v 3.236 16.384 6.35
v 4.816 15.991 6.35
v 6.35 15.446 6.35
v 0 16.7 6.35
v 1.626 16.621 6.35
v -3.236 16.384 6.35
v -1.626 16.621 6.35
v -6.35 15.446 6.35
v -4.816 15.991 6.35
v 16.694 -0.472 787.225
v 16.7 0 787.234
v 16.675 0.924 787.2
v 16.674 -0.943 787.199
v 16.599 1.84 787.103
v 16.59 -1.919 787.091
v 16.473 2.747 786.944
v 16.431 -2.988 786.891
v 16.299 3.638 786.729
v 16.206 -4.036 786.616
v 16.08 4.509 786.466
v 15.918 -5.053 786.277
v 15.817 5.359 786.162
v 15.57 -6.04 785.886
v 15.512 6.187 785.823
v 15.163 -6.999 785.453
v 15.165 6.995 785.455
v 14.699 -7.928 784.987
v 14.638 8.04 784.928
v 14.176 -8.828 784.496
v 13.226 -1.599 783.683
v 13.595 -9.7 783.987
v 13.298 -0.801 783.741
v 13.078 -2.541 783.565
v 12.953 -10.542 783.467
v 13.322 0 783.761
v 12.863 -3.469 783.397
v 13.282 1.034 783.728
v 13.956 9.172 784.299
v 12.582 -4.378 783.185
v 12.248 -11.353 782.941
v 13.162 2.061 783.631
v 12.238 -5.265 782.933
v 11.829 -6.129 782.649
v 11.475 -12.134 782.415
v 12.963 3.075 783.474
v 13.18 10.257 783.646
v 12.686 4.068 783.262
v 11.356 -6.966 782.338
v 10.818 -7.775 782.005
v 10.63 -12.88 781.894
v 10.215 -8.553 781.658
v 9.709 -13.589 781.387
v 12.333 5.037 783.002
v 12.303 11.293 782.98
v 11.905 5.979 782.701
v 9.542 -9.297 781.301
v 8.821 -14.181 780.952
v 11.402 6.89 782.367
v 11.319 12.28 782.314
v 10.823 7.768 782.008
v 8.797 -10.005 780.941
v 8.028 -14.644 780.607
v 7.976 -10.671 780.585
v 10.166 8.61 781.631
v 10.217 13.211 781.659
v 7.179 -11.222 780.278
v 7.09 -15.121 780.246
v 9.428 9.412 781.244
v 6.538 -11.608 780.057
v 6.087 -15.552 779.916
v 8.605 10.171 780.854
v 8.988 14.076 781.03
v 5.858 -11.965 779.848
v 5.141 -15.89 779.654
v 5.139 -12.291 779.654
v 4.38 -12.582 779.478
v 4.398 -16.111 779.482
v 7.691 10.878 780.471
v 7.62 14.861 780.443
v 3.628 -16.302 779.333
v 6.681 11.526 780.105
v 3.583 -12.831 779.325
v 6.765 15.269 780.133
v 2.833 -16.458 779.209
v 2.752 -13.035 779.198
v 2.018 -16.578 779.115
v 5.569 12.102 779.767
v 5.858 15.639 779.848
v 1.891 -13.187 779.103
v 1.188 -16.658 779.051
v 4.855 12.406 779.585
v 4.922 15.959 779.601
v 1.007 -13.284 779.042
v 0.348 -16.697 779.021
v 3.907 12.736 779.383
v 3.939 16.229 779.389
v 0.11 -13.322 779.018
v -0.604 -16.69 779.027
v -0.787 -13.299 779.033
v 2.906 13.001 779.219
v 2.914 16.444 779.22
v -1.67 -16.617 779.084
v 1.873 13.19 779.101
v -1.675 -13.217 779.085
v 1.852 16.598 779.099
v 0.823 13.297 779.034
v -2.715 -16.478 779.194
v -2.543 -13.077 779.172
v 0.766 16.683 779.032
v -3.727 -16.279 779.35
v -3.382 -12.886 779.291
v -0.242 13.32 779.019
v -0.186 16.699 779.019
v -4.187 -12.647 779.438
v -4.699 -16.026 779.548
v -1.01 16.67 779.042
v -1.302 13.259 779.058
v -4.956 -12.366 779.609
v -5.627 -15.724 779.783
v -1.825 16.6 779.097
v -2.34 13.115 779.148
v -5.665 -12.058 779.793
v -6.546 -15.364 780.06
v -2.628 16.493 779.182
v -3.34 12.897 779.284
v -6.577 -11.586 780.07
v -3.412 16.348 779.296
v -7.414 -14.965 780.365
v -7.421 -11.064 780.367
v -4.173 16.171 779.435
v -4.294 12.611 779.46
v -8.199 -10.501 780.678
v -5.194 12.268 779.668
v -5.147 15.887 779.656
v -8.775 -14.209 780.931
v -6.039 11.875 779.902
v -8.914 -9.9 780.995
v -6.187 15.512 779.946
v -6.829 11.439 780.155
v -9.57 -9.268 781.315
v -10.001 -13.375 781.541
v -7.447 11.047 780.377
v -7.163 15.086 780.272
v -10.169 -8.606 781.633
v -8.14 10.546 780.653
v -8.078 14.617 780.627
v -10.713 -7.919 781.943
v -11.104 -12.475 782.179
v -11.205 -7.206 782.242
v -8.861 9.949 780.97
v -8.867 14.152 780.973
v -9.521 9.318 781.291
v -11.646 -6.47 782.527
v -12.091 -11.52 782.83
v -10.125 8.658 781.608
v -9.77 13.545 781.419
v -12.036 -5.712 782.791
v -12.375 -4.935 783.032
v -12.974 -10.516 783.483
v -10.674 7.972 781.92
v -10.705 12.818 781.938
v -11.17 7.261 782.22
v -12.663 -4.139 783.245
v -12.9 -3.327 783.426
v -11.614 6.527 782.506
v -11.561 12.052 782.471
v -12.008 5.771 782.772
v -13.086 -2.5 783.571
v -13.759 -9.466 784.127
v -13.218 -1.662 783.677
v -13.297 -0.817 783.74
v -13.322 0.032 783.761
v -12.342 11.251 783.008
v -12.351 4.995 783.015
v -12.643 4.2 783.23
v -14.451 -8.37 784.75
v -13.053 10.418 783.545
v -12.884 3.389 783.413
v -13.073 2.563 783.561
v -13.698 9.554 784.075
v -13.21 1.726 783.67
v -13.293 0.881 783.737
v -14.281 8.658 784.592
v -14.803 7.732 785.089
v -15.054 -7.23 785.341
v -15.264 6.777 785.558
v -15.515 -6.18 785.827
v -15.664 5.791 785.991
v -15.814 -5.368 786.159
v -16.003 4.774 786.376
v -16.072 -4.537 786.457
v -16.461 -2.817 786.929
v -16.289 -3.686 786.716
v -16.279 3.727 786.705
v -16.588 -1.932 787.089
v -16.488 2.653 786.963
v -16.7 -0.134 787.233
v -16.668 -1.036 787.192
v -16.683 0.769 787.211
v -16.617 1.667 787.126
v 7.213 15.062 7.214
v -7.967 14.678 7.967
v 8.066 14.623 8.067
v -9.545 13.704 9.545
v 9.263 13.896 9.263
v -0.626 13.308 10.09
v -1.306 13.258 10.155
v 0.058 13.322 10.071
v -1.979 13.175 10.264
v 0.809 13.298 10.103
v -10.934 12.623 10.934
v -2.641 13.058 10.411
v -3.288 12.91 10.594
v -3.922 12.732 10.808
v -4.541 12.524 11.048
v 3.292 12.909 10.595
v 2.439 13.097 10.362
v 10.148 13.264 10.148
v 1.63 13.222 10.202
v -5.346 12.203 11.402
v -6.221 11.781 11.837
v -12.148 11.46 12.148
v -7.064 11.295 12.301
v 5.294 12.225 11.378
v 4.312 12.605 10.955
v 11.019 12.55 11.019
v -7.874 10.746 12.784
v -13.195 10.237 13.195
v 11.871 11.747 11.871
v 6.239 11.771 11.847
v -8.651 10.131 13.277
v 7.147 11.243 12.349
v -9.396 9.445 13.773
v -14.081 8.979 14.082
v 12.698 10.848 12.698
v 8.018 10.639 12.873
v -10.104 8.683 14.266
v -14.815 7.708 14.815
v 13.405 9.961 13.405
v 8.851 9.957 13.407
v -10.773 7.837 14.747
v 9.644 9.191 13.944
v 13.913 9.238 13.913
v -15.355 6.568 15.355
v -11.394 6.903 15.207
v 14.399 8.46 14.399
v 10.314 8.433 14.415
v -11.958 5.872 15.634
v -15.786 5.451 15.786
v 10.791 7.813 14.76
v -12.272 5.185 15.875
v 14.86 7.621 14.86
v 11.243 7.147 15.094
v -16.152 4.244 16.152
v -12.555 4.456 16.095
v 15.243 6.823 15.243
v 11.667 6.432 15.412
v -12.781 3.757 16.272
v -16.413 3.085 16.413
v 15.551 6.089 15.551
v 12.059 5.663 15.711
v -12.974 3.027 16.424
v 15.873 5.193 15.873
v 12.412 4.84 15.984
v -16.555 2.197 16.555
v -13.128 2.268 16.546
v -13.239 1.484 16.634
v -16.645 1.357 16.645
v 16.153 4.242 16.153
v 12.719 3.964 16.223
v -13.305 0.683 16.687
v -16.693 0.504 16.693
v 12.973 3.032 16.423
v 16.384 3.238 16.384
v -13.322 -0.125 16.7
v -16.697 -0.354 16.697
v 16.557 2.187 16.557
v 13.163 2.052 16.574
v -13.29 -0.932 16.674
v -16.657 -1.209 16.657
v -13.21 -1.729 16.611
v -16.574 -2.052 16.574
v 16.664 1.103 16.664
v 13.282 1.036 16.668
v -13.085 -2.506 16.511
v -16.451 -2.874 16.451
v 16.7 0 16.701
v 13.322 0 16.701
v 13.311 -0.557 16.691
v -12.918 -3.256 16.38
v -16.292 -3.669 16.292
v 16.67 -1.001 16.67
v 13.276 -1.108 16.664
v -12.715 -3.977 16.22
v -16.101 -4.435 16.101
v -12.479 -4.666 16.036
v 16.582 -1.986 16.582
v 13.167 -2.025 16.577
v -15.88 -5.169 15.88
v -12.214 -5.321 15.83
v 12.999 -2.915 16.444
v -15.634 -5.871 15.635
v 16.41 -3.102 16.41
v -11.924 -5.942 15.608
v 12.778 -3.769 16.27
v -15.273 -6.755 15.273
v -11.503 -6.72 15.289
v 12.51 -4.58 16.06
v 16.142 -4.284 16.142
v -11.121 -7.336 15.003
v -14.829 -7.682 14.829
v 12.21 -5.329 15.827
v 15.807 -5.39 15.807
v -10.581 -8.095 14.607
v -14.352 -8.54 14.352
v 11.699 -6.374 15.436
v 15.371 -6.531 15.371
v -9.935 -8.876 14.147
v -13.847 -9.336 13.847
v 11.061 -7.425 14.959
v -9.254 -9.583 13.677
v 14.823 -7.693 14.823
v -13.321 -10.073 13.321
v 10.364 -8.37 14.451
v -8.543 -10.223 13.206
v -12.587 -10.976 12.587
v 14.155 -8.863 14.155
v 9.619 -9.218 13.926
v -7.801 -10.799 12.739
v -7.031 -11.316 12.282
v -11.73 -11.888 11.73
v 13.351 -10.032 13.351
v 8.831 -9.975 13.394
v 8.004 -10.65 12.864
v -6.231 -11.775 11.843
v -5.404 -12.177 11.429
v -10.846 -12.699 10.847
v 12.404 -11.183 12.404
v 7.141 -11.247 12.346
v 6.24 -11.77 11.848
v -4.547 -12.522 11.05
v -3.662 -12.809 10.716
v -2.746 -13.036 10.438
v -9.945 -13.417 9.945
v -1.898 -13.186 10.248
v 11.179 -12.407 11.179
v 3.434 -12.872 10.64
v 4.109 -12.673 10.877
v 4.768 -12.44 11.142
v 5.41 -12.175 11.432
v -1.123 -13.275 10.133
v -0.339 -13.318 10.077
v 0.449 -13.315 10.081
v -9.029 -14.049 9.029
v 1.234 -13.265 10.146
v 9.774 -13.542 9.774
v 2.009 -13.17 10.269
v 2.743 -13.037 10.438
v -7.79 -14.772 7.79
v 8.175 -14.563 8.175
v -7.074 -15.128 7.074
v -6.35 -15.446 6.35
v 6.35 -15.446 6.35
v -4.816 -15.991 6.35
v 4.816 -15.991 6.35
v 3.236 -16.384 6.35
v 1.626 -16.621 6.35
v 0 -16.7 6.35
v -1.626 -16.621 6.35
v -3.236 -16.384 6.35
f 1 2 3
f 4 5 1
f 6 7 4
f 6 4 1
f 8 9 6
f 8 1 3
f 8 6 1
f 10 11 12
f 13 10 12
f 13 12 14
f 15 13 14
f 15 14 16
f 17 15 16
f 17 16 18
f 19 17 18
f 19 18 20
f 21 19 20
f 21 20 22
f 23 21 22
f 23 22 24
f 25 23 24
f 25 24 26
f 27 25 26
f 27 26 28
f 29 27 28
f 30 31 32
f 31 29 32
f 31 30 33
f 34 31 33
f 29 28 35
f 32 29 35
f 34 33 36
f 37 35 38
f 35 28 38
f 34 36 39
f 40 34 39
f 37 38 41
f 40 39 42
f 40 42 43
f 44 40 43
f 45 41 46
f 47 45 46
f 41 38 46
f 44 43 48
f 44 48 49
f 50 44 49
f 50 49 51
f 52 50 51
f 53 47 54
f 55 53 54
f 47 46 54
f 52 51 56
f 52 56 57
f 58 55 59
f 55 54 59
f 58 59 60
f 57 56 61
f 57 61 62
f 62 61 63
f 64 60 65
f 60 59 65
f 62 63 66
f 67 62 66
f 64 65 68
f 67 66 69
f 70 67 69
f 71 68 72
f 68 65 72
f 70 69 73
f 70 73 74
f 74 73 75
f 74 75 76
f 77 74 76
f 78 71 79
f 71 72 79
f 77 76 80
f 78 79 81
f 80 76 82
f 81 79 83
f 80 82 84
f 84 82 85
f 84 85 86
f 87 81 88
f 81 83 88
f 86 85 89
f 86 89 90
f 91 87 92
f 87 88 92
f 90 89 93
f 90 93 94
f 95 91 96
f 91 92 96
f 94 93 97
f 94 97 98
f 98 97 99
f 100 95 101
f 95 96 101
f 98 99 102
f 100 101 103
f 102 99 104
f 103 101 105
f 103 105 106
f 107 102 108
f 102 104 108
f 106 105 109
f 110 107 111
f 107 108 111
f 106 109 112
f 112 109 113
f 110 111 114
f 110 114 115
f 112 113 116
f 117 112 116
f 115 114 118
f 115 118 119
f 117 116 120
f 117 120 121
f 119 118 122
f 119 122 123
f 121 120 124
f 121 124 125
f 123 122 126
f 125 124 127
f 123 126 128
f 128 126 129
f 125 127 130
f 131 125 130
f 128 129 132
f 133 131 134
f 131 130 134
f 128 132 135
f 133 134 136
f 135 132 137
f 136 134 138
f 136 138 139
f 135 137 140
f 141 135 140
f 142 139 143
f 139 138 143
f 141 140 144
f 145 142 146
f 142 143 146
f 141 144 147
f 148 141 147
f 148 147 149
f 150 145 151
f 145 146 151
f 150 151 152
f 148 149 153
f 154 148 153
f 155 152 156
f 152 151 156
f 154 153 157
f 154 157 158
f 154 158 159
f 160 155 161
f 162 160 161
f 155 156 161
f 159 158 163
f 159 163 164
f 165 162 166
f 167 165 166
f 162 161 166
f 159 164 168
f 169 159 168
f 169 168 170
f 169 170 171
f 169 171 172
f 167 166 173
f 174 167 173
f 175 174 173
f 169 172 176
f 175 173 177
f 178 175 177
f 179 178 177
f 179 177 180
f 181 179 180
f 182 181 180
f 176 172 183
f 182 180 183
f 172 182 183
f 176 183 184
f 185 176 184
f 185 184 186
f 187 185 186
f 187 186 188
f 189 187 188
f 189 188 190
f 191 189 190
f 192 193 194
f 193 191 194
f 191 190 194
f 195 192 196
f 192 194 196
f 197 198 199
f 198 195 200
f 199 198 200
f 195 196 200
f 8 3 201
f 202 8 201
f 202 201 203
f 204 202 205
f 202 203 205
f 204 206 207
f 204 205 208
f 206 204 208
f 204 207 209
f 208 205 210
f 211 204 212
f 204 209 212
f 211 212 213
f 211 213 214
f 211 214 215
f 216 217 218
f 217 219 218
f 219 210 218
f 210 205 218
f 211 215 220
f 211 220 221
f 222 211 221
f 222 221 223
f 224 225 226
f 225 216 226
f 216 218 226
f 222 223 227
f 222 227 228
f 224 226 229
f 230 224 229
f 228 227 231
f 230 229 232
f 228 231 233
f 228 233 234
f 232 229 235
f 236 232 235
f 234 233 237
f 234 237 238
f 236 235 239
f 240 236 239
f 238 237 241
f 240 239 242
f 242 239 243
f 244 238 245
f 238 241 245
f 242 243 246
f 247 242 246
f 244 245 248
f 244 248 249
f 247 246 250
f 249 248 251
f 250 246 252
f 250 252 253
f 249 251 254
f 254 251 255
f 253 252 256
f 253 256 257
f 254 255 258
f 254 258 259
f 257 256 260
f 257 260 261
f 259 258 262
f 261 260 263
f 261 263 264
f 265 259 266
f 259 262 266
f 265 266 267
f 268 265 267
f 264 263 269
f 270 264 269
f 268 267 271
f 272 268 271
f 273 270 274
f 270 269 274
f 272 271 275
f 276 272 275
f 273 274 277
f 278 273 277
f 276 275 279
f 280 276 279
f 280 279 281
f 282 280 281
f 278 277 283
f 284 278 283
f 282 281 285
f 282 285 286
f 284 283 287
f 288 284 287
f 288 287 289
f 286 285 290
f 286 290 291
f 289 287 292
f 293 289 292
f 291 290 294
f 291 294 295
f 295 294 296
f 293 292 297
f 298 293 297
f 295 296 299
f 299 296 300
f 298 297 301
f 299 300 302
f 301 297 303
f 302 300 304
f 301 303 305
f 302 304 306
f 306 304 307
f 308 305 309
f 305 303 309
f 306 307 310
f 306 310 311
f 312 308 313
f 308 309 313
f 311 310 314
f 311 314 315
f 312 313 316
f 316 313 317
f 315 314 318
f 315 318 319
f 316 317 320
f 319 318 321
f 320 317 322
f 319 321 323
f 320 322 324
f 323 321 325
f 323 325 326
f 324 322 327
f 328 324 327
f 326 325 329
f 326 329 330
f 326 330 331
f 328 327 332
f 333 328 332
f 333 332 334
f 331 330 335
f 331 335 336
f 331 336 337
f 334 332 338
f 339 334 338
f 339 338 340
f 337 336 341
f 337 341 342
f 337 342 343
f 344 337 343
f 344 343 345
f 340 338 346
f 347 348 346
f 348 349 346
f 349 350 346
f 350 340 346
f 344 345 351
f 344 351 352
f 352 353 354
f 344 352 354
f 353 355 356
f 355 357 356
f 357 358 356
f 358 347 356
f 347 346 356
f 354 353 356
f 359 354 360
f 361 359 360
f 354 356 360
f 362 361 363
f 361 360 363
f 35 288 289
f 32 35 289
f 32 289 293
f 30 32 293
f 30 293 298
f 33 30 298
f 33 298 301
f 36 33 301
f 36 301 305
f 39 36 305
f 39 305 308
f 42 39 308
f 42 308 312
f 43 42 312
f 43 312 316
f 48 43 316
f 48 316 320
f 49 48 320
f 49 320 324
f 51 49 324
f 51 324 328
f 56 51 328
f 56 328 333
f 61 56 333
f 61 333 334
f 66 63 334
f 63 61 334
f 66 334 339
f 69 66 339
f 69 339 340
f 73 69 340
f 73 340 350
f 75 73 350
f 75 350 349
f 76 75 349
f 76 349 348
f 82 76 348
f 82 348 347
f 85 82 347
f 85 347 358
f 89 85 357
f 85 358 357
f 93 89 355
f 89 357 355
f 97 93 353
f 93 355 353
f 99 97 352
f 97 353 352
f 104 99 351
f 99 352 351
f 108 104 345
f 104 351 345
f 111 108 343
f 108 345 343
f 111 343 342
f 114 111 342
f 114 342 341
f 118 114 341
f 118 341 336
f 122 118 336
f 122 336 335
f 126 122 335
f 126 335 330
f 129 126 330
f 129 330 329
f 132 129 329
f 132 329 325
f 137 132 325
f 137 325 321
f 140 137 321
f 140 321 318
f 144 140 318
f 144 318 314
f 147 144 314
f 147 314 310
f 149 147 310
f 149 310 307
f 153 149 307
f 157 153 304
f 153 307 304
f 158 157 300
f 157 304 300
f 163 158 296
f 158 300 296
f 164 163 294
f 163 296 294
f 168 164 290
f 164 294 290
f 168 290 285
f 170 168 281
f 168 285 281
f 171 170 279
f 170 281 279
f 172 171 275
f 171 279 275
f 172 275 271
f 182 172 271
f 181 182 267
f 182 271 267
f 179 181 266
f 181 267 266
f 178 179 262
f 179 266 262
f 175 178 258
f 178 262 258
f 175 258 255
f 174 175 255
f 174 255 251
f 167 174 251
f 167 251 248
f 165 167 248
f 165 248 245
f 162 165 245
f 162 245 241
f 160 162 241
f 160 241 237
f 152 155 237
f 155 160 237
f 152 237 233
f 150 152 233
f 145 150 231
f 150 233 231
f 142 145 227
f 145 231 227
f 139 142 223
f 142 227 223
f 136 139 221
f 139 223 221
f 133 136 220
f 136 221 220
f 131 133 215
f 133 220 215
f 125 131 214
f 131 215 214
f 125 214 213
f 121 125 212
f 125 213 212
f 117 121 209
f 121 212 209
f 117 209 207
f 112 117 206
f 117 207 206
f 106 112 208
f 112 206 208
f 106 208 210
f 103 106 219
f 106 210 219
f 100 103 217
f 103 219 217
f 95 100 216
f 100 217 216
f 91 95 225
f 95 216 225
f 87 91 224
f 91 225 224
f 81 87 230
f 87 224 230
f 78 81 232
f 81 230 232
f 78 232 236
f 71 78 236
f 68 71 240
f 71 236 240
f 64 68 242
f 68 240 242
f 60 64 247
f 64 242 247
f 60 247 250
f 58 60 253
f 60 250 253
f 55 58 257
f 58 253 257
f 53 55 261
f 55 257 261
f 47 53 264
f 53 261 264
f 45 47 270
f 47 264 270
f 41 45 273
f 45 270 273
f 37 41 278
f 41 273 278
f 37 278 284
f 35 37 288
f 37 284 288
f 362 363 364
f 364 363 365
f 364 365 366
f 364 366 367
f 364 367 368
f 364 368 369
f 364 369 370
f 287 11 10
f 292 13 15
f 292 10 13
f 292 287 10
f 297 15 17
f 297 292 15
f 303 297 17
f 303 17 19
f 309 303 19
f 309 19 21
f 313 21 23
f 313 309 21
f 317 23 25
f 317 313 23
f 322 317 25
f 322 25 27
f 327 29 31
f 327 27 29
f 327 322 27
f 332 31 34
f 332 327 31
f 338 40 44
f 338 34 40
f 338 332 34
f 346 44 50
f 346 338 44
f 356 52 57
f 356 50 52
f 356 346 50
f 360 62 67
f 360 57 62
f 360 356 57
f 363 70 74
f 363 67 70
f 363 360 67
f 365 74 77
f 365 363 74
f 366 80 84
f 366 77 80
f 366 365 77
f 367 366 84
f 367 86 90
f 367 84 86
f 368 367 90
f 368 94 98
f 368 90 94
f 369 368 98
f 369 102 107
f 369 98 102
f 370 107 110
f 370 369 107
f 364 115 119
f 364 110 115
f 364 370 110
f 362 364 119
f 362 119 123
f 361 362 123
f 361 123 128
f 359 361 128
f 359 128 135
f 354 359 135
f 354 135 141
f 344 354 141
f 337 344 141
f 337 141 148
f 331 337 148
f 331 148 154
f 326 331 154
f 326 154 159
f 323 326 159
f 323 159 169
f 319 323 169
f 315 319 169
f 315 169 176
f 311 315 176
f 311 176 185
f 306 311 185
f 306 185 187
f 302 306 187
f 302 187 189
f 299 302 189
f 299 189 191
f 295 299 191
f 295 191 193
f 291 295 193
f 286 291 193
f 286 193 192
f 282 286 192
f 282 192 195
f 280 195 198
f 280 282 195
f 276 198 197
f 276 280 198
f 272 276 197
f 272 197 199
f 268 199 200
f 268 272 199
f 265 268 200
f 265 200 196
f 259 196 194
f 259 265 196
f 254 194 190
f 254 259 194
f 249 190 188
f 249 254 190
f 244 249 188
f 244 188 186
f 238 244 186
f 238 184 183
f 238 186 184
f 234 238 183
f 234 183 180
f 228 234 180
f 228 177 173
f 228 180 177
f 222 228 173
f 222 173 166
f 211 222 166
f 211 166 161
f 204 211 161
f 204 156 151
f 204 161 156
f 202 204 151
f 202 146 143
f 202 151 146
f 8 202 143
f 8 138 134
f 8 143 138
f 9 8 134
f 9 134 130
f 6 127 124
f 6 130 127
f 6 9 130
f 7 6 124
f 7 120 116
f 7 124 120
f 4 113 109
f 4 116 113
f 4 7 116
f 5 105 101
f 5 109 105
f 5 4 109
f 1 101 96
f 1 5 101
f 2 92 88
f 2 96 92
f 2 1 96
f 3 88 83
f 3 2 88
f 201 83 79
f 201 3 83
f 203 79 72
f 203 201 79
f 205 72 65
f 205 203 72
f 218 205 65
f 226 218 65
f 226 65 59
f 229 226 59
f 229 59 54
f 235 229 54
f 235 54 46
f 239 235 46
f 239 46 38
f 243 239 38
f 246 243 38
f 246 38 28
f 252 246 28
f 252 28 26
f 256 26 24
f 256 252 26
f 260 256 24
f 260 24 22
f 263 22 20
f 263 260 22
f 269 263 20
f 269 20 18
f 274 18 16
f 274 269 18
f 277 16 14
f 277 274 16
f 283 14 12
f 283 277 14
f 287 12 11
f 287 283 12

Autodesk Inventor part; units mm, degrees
ref_plane "Start plane" through (0, 0, 0) normal (0, 0, 1) x (1, 0, 0)
ref_plane "End plane" through (0, 0, 800.1) normal (0, 0, 1) x (1, 0, 0)
sketch "Sketch" plane through (0, 0, 0) normal (0, 0, 1) x (1, 0, 0)
  circle A0 centre (0, 0) radius 13.3223
  circle A1 centre (0, 0) radius 16.7005
  dimension "d0" = 33.401
  dimension "d1" = 3.3782
extrude "Body" add sketch "Sketch" along normal up to surface (800.1 mm away) from surface at 0
sketch "Sketch3" plane through (0, 0, 0) normal (0, 0, 1) x (1, 0, 0)
  line L0 (0, 0) -> (10, 0)
ref_plane "Work Plane3" through (0, 0, 0) normal (0, -1, 0) x (1, 0, 0)
sketch "Sketch4" plane through (0, 0, 0) normal (0, -1, 0) x (1, 0, 0)
  line L0 (-2, 0) -> (12, 0)
  line L1 (-2, 800.1) -> (12, 800.1)
  dimension "d7" = 800.1
ref_plane "Work Plane4" through (0, 53.34, 800.1) normal (0, -1, 0) x (1, 0, 0)
ref_plane "Work Plane5" through (0, -22.86, 800.1) normal (0, -1, 0) x (1, 0, 0)
ref_plane "Work Plane6" through (0, 15.24, 800.1) normal (0, -1, 0) x (1, 0, 0)
sketch "Sketch5" plane through (0, 15.24, 800.1) normal (0, -1, 0) x (1, 0, 0)
  circle A0 centre (0, 0) radius 21.082
  circle A1 centre (0, 0) radius 17.526
extrude "Extrusion2" cut sketch "Sketch5" along normal up to surface (76.2 mm away) from surface at -38.1 contours A0 | A1
ref_plane "Work Plane7" through (16.7005, 0, 0) normal (1, 0, 0) x (0, 1, 0)
sketch "Sketch6" plane through (16.7005, 0, 0) normal (1, 0, 0) x (0, 1, 0)
  arc A0 (15.4462, 6.35) -> (-15.4462, 6.35) centre (0, 0) ccw projected
  line L0 (-16.7005, 0) -> (16.7005, 0) projected
  arc A1 (16.7005, 0) -> (-16.7005, 0) centre (0, 0) ccw
  point P0 (0, 0)
extrude "Extrusion3" cut sketch "Sketch6" against normal through all
ref_plane "Work Plane8" through (0, 16.7005, 0) normal (0, 1, 0) x (-1, 0, 0)
sketch "Sketch7" plane through (0, 16.7005, 0) normal (0, 1, 0) x (-1, 0, 0)
  line L0 (0, 0) -> (-16.7005, 16.7005) projected
  line L1 (16.7005, 16.7005) -> (0, 0) projected
  line L2 (-6.35, 6.35) -> (6.35, 6.35)
  dimension "d12" = 6.35
extrude "Extrusion4" cut sketch "Sketch7" against normal through all
equation "\"d0\" = G_H"
equation "\"d1\" = G_T"
equation "\"d2\" = G_L"
equation "\"G_H\" = 33.401"
equation "\"G_T\" = 3.3782"
equation "\"G_L\" = d7"
equation "\"G_OFFSET_START\" = 0"
equation "\"G_OFFSET_END\" = 0"
equation "\"d5\" = G_OFFSET_END + B_L"
equation "\"B_L\" = 800.1"
properties part number "ANSI - 1 x 0.133 - 31.5" material "Aluminum 6061"
